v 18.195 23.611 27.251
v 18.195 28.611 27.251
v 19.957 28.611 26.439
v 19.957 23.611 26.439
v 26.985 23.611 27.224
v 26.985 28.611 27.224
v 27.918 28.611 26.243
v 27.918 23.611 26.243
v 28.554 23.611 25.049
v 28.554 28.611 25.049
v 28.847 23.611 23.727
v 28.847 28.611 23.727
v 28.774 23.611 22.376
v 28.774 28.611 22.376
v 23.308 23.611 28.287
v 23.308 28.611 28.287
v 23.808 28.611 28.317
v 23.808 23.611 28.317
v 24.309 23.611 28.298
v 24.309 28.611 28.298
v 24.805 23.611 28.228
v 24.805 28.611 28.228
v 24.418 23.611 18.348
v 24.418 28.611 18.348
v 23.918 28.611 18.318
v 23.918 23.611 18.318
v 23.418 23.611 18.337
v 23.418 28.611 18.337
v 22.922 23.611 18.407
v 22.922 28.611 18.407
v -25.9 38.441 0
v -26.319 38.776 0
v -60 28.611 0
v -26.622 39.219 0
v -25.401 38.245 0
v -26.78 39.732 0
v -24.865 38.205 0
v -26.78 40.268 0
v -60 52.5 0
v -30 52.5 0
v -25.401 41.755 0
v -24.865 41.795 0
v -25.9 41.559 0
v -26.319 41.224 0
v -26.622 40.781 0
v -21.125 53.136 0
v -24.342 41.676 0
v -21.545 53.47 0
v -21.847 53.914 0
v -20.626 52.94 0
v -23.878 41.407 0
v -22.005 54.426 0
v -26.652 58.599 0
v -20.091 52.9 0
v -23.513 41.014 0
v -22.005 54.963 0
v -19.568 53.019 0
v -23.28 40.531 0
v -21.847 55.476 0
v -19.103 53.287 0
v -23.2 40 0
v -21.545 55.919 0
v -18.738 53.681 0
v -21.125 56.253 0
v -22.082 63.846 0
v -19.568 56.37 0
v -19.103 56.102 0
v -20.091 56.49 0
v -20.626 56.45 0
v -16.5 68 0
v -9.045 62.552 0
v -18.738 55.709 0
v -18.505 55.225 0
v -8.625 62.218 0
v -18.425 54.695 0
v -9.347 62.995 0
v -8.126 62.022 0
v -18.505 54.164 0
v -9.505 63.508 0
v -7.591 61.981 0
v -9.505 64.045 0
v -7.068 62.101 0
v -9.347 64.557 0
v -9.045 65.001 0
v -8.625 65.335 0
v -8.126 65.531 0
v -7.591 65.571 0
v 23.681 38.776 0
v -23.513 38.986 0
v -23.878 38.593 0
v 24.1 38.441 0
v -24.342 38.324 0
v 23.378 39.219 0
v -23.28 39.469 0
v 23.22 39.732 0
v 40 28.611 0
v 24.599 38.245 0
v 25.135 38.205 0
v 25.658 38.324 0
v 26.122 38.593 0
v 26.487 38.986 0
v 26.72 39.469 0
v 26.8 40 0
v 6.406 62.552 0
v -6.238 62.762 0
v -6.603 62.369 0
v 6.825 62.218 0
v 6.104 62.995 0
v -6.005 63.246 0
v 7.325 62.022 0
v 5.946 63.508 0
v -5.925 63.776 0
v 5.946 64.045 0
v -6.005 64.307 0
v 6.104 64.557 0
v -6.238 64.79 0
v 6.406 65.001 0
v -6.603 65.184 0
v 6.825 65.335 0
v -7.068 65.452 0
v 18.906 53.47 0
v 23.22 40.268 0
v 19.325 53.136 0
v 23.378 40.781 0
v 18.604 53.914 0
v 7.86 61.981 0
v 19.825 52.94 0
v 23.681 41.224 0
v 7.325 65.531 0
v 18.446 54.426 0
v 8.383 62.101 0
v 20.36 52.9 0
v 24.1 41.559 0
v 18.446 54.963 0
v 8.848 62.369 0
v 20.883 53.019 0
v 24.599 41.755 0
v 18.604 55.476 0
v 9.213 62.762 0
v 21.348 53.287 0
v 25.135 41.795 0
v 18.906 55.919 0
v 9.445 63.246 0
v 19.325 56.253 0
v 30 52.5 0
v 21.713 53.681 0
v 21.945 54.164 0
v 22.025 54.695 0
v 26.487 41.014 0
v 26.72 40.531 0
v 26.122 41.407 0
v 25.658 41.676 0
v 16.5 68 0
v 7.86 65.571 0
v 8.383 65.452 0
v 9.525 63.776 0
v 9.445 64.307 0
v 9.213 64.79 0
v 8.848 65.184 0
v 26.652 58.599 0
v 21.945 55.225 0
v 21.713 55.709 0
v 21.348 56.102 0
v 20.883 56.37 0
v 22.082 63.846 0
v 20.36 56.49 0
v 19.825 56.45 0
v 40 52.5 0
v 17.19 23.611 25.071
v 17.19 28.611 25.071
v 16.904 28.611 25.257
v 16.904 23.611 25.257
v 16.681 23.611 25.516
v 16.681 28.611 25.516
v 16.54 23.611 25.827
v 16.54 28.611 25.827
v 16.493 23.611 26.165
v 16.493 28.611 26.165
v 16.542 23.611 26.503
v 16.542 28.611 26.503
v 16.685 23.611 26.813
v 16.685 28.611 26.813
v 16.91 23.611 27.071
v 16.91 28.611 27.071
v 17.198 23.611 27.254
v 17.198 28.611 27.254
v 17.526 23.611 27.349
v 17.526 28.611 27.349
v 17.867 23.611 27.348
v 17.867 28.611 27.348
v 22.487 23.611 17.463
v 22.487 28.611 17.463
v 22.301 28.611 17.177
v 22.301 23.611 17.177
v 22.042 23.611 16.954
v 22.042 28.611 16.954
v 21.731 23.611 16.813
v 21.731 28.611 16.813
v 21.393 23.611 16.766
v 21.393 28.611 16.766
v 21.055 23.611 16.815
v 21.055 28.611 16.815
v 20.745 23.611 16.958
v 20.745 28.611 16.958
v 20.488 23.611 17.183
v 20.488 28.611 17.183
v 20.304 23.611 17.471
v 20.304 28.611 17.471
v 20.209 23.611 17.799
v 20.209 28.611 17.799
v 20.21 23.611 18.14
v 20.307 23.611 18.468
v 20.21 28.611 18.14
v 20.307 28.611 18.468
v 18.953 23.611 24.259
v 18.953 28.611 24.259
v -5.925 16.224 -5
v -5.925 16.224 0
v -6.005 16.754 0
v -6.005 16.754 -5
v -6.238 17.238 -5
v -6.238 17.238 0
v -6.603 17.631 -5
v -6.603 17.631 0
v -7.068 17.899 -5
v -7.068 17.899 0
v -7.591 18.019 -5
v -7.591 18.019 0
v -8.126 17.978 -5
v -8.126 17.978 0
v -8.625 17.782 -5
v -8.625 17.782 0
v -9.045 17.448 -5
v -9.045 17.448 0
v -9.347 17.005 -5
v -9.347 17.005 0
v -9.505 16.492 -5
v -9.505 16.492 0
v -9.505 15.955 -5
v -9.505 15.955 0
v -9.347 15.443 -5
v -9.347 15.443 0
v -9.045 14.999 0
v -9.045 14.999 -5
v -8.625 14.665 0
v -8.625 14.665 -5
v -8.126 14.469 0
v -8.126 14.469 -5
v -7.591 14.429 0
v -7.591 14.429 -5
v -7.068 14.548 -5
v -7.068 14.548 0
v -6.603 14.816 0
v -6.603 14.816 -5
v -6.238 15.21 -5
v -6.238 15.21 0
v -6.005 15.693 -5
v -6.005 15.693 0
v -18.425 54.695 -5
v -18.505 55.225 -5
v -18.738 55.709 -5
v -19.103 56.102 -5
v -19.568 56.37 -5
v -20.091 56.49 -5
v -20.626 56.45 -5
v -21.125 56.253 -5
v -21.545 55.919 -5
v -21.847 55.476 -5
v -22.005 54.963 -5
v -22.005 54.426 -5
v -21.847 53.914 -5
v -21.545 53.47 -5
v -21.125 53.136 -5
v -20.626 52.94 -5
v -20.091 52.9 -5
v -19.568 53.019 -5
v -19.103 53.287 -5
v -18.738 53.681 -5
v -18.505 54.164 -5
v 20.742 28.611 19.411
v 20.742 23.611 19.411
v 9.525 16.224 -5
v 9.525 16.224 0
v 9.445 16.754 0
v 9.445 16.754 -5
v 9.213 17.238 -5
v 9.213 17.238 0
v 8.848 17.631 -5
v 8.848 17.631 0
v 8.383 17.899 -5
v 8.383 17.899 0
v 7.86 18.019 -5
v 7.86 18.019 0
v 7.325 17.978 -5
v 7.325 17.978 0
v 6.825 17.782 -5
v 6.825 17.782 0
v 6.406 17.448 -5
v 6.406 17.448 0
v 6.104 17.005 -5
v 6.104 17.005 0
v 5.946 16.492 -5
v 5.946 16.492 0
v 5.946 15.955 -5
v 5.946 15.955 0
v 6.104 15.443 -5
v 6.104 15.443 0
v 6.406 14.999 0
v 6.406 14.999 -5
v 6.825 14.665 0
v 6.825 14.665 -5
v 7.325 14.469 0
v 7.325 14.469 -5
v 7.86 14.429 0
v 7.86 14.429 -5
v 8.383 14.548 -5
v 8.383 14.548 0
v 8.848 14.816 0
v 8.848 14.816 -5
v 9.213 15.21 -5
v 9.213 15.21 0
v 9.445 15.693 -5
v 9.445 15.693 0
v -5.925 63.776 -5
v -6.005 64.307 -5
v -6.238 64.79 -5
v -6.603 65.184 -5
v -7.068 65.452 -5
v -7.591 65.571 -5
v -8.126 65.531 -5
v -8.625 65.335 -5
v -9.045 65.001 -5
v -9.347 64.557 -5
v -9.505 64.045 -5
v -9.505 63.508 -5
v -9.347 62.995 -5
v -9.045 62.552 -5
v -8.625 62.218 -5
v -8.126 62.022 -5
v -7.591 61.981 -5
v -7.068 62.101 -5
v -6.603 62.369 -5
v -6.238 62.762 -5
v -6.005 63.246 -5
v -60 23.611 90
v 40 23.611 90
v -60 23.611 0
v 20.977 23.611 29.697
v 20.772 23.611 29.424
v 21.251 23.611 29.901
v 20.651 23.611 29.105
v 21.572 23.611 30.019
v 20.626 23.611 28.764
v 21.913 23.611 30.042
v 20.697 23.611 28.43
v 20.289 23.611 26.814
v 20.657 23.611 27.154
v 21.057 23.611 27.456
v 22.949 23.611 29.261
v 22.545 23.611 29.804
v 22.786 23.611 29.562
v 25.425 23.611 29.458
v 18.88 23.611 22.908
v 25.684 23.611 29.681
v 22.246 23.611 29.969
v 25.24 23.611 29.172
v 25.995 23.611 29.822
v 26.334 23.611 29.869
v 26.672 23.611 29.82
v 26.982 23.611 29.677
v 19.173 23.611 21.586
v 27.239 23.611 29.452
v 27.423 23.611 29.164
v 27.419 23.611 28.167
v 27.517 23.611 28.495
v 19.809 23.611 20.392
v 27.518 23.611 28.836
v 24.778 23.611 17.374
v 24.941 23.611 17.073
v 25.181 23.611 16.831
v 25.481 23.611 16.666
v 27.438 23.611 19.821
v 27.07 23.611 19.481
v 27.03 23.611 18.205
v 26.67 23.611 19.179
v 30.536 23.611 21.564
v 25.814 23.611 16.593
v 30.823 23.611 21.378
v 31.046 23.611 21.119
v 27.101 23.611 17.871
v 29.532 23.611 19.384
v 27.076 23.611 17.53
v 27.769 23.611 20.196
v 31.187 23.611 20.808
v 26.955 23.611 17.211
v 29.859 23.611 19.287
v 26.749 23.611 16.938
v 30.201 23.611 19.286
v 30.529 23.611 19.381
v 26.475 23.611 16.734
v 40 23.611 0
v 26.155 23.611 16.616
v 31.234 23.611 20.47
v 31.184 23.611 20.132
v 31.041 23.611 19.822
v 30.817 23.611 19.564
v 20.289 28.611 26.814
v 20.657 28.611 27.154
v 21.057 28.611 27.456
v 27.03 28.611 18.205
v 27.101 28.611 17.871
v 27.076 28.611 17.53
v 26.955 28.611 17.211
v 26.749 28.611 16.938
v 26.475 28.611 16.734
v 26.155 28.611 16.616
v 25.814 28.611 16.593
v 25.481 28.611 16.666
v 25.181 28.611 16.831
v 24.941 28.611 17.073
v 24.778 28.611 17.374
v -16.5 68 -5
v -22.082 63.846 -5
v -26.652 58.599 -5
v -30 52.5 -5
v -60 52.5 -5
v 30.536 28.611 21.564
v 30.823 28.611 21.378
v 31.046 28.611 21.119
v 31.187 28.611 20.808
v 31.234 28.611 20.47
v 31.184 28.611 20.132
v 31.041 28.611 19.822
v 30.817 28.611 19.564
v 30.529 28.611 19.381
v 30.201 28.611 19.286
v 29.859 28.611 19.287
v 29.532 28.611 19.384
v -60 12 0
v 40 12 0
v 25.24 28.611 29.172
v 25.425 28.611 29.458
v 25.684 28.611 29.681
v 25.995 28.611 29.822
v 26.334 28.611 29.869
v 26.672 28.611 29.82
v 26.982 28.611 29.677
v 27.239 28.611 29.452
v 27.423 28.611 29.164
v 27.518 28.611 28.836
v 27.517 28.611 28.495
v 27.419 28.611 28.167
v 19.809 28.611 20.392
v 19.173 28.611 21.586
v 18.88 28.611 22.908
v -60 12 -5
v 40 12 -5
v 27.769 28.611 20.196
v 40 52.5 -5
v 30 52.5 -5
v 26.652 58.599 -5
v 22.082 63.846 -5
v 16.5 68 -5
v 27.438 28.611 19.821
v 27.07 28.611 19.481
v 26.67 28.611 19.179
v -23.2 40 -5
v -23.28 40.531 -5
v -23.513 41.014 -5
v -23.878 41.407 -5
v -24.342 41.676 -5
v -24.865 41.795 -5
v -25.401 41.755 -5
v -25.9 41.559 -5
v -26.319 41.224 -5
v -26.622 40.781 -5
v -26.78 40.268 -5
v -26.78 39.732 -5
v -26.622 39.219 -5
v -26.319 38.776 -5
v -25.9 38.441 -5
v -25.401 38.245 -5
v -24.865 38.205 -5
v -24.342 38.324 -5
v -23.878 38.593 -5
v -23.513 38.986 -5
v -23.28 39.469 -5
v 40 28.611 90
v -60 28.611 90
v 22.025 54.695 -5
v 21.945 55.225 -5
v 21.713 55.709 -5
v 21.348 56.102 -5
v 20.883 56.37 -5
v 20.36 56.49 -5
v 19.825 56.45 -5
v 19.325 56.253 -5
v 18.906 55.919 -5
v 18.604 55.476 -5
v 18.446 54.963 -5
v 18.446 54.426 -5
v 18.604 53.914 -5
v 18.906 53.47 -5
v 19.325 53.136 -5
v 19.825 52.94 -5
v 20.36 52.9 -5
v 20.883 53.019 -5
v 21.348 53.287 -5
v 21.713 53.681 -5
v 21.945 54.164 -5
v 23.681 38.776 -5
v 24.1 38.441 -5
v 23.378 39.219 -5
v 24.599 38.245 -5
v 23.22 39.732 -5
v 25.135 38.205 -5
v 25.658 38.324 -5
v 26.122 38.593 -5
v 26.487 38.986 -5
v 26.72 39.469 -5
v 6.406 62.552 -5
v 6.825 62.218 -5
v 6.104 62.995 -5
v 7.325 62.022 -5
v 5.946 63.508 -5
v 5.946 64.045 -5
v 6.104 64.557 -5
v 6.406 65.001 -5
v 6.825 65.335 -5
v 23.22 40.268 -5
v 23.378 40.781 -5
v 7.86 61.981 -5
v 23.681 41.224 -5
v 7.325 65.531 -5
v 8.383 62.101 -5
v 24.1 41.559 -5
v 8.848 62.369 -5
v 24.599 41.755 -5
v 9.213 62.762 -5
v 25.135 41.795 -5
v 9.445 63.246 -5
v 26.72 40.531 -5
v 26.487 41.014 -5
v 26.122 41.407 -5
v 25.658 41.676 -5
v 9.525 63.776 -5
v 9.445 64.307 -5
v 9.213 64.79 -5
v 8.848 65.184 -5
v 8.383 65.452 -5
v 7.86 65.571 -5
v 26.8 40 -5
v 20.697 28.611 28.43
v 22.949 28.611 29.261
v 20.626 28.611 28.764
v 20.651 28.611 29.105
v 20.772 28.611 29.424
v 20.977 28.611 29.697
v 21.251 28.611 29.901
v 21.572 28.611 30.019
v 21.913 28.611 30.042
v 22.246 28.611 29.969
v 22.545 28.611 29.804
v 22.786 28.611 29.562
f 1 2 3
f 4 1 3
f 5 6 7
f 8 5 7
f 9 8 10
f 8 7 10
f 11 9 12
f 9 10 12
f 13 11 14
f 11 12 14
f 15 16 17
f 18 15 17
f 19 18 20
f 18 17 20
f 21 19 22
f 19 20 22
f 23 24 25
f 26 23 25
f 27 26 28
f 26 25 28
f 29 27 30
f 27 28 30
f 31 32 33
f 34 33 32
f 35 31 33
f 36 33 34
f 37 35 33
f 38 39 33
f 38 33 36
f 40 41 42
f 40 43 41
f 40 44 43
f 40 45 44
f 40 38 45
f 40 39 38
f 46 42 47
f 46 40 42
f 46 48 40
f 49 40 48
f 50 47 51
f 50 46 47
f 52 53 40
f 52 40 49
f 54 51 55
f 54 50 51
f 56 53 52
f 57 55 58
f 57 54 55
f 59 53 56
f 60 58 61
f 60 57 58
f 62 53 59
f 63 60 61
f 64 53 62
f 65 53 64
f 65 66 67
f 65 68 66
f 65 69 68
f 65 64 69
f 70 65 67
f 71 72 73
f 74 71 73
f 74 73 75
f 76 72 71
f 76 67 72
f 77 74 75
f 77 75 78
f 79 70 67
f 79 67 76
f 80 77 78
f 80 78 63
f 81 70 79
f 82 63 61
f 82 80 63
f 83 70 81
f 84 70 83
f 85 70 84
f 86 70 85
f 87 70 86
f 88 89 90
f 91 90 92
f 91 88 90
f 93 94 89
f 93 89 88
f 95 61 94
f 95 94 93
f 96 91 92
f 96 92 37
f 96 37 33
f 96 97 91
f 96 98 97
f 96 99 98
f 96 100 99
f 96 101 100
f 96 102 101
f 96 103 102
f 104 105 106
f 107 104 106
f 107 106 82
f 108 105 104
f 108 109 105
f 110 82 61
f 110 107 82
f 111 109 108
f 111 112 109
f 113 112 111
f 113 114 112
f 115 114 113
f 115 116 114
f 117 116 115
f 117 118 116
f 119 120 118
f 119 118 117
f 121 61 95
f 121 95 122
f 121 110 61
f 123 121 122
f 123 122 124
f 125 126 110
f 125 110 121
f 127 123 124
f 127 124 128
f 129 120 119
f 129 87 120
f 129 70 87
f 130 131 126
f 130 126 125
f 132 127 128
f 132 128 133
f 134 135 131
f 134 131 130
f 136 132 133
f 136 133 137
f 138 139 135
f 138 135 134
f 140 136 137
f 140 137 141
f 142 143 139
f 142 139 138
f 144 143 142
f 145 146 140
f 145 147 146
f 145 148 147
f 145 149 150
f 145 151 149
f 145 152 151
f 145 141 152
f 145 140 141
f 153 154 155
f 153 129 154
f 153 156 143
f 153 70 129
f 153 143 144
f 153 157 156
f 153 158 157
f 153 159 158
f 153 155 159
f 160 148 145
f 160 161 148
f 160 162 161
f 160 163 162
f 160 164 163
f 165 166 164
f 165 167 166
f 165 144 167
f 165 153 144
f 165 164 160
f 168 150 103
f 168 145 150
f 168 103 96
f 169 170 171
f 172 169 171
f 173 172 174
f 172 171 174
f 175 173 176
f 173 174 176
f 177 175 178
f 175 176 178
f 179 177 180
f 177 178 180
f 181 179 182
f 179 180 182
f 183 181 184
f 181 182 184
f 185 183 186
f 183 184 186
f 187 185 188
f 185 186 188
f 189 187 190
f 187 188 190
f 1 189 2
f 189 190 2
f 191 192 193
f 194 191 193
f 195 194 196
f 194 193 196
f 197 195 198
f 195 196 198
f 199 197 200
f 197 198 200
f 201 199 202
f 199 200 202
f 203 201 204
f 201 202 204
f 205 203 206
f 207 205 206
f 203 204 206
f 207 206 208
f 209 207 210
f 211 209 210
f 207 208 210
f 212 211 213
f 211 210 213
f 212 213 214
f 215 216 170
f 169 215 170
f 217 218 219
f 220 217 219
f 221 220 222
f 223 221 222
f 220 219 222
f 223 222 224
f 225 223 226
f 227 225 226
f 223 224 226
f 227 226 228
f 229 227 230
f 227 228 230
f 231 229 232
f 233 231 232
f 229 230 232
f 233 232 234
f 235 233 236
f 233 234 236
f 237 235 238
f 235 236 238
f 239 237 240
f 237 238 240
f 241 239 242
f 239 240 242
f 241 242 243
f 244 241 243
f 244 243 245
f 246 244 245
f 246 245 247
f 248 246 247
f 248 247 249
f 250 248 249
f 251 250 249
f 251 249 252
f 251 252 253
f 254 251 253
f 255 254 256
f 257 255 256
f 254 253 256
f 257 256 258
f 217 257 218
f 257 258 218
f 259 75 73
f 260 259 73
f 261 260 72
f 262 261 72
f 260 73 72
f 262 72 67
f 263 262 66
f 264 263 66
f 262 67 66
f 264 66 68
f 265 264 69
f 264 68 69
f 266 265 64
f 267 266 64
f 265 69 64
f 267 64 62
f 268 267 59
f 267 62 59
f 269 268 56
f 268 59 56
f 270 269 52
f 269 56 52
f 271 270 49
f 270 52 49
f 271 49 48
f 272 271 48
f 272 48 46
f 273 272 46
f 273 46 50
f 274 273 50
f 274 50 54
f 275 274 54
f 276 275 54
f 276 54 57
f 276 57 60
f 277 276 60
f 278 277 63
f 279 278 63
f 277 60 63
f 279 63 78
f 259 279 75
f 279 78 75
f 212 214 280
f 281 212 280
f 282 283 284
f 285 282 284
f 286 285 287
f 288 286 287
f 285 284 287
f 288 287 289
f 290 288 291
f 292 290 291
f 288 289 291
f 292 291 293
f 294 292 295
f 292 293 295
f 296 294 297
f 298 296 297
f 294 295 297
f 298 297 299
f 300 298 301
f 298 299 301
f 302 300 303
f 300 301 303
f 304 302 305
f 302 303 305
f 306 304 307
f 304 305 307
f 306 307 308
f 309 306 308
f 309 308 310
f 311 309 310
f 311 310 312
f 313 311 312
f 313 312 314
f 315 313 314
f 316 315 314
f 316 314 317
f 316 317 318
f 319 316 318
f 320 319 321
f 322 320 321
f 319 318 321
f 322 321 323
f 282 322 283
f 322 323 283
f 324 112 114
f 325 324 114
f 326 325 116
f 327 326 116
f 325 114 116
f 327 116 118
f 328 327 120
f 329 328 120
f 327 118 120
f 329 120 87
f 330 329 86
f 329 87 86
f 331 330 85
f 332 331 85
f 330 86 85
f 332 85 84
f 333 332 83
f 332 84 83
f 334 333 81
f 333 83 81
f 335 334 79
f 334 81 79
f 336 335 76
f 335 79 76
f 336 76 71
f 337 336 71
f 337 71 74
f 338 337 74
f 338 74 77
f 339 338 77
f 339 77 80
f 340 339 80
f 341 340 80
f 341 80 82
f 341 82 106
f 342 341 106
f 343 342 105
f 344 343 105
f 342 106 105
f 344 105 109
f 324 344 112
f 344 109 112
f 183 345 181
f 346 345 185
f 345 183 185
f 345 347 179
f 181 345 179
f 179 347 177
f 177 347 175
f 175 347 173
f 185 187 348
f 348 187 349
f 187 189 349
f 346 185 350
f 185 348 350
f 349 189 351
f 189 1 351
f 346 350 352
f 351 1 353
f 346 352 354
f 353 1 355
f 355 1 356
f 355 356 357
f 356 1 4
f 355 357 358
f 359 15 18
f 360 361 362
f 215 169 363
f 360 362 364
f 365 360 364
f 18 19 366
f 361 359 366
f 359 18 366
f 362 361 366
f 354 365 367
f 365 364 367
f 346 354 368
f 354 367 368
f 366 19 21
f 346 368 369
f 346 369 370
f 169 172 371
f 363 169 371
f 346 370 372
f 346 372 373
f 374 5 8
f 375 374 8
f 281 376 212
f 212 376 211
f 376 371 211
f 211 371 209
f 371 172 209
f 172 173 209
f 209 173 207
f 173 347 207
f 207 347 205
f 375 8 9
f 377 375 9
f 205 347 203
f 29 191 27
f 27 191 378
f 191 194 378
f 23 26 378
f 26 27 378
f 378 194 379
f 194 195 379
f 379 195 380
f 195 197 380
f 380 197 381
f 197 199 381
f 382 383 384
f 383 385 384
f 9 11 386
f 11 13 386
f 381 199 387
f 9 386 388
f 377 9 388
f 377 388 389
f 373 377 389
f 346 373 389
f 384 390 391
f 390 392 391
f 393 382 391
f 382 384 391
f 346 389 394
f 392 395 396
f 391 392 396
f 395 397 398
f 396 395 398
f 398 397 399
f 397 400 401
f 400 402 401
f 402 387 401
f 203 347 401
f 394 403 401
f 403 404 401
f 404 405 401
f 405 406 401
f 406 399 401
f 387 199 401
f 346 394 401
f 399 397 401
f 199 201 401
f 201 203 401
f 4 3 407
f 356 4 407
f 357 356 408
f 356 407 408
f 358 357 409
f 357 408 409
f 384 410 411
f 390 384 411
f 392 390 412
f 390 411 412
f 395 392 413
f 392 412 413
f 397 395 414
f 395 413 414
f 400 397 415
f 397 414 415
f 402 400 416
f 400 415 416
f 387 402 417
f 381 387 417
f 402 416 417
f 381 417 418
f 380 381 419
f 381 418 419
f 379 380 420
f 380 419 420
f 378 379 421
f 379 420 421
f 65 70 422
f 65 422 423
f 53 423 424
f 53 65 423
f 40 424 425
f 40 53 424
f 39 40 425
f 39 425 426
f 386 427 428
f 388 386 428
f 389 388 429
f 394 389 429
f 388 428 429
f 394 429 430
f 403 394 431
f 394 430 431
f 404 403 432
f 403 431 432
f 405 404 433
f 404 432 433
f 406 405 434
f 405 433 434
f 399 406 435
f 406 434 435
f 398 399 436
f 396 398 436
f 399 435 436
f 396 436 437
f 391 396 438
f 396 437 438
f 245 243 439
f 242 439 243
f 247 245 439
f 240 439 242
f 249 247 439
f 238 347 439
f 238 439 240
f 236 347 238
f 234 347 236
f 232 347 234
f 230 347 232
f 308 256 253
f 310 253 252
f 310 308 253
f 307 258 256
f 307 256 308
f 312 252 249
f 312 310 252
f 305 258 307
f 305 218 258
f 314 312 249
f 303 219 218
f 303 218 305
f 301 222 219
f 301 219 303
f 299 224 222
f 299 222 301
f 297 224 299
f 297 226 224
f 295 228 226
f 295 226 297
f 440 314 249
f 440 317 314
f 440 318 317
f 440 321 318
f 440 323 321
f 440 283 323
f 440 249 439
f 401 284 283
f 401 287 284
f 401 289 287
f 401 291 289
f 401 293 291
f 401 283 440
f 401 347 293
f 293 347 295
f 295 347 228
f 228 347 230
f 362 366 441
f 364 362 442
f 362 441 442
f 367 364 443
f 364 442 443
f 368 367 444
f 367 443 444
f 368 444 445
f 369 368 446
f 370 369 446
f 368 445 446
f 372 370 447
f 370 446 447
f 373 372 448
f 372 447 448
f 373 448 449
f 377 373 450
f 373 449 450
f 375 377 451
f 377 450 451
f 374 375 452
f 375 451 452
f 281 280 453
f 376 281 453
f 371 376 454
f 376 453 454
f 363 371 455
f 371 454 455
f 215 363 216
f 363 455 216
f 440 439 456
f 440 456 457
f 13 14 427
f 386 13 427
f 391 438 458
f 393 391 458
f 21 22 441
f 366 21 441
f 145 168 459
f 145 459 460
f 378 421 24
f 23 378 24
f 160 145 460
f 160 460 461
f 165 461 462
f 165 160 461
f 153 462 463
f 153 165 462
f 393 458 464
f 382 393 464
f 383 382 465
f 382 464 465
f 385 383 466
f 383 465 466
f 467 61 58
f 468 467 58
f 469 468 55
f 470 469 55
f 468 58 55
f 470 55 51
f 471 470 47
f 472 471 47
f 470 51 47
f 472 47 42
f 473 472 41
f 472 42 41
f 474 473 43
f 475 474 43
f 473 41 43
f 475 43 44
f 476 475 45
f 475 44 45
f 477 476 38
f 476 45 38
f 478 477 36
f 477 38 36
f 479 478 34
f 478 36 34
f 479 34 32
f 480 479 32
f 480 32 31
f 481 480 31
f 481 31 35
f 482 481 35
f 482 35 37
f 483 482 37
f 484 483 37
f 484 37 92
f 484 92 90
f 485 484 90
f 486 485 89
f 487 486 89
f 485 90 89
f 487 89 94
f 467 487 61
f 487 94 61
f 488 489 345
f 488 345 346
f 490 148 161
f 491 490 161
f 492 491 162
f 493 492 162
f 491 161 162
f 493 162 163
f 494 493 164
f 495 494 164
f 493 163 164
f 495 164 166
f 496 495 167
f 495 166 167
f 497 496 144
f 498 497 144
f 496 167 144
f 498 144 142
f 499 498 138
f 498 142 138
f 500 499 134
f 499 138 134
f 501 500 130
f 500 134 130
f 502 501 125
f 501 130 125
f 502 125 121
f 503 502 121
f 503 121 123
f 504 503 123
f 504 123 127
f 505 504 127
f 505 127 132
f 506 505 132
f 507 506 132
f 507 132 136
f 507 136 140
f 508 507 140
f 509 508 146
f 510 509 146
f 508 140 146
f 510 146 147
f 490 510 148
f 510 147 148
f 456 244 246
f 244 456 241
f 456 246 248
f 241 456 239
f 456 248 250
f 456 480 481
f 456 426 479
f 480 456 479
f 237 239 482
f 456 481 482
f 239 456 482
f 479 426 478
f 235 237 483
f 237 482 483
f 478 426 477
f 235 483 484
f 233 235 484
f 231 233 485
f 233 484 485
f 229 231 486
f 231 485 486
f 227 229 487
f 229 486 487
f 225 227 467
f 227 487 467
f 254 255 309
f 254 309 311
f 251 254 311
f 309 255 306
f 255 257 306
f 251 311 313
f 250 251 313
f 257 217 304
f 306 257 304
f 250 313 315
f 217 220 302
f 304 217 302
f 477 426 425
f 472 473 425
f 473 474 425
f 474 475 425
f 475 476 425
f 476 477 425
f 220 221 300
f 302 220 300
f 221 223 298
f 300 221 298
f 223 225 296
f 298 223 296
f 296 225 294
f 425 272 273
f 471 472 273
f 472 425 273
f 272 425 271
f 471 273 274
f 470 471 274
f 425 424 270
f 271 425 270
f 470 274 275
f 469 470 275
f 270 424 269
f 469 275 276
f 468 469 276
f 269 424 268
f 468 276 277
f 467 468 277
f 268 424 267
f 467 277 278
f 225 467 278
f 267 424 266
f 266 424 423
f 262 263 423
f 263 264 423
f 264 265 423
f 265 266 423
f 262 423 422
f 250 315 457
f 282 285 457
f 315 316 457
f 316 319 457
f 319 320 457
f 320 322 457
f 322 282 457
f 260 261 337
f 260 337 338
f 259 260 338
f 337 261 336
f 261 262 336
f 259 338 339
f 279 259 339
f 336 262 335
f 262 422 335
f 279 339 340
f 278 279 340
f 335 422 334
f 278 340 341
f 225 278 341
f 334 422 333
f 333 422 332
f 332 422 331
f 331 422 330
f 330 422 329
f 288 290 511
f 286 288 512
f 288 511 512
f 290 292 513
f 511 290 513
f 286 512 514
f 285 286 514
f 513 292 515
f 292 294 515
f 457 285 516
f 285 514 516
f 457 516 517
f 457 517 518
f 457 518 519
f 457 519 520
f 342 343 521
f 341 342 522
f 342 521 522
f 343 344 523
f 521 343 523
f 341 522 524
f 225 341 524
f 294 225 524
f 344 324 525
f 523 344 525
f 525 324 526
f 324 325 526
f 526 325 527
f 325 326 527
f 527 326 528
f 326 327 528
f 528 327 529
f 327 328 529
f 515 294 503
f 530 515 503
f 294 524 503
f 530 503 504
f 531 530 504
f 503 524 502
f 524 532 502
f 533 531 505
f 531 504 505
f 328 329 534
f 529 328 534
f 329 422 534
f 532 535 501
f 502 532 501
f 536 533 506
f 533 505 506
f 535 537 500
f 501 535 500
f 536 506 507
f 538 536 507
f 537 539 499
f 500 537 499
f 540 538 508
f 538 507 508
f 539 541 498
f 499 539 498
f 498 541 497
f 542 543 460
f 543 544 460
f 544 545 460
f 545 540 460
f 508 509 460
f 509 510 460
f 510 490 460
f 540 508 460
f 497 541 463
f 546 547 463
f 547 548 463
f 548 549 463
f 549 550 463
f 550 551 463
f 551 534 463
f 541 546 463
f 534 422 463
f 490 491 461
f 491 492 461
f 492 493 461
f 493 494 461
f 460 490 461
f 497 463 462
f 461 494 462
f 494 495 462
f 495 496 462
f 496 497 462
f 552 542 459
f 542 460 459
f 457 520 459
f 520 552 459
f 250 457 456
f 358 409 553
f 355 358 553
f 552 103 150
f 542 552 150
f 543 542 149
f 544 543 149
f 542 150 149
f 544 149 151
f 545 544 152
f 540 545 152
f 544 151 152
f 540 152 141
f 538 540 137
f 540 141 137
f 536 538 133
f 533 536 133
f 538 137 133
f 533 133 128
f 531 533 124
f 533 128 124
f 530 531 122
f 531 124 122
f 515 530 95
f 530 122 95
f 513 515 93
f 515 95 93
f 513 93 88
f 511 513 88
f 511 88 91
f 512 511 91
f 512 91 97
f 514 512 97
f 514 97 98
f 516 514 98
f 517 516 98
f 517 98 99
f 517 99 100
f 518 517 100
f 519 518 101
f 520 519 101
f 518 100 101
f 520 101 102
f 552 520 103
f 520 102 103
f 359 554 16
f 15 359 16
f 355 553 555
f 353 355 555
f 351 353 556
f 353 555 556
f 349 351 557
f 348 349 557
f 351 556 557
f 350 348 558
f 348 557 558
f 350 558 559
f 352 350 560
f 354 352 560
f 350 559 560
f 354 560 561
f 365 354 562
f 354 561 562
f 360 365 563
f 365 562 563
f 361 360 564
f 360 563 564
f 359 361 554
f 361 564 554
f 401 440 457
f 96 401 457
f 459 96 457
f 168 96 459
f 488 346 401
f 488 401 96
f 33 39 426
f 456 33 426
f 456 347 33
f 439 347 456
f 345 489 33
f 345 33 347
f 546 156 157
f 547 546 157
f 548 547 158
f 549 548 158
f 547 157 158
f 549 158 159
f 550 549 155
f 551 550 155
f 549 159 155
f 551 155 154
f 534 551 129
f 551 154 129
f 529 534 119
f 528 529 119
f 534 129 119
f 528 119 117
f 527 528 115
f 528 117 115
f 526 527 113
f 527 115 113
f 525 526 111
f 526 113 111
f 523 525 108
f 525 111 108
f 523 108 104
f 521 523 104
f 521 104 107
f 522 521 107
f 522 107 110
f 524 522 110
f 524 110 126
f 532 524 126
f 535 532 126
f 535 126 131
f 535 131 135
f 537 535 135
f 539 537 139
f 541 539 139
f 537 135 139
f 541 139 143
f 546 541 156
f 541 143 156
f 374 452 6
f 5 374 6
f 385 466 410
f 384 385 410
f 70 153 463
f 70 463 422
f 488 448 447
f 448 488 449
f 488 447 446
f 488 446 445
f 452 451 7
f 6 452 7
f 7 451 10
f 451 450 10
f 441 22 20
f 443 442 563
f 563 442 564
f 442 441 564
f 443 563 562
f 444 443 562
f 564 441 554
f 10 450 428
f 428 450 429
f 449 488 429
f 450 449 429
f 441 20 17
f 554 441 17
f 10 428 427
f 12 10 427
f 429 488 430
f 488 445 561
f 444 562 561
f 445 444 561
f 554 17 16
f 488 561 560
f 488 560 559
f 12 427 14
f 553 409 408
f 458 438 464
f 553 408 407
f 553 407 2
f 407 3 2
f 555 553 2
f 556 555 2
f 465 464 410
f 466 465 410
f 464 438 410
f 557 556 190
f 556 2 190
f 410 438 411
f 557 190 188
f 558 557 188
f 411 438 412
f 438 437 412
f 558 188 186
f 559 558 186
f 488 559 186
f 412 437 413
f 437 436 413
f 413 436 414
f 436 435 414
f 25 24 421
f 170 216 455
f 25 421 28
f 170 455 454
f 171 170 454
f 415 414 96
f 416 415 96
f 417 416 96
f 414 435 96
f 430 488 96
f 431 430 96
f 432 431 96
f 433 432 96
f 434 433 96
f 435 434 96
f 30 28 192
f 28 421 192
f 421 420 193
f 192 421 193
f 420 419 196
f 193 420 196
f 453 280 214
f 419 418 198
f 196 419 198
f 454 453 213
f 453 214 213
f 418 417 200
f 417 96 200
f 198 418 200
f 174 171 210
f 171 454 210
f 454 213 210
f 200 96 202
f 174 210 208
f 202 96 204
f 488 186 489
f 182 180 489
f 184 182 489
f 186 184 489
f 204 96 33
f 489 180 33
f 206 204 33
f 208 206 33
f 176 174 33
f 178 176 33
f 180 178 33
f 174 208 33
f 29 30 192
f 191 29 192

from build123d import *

# Parameters (mm, degrees)
SKETCH2_R           = 1.8
BOSS_EXTRUDE1_DEPTH = 5
SKETCH3_R           = 1.8
BOSS_EXTRUDE2_DEPTH = 5
BOSS_EXTRUDE3_DEPTH = 90
SKETCH5_R           = 1
CUT_EXTRUDE3_DEPTH  = 90
CUT_EXTRUDE4_DEPTH  = 90


with BuildPart() as part:
    # Sketch2 → Boss-Extrude1 (new body)
    with BuildSketch(Plane.XY):
        with BuildLine():
            ThreePointArc((30, 52.5), (24.507651866, 61.345374206), (16.5, 68))
            Line((16.5, 68), (-16.5, 68))
            ThreePointArc((-16.5, 68), (-24.507651866, 61.345374206), (-30, 52.5))
            Line((-30, 52.5), (-60, 52.5))
            Line((-60, 52.5), (-60, 12))
            Line((-60, 12), (40, 12))
            Line((40, 12), (40, 52.5))
            Line((40, 52.5), (30, 52.5))
        make_face()
        with Locations((-20.225424859, 25.305368693)):
            Circle(SKETCH2_R, mode=Mode.SUBTRACT)
        with Locations((-25, 40)):
            Circle(SKETCH2_R, mode=Mode.SUBTRACT)
        with Locations((-7.725424859, 16.223587093)):
            Circle(SKETCH2_R, mode=Mode.SUBTRACT)
        with Locations((7.725424859, 16.223587093)):
            Circle(SKETCH2_R, mode=Mode.SUBTRACT)
        with Locations((20.225424859, 25.305368693)):
            Circle(SKETCH2_R, mode=Mode.SUBTRACT)
        with Locations((25, 40)):
            Circle(SKETCH2_R, mode=Mode.SUBTRACT)
        with Locations((-20.225424859, 54.694631307)):
            Circle(SKETCH2_R, mode=Mode.SUBTRACT)
        with Locations((-7.725424859, 63.776412907)):
            Circle(SKETCH2_R, mode=Mode.SUBTRACT)
        with Locations((7.725424859, 63.776412907)):
            Circle(SKETCH2_R, mode=Mode.SUBTRACT)
        with Locations((20.225424859, 54.694631307)):
            Circle(SKETCH2_R, mode=Mode.SUBTRACT)
    extrude(amount=-BOSS_EXTRUDE1_DEPTH)

    # Sketch3 → Boss-Extrude2 (add)
    with BuildSketch(Plane.XY):
        with Locations((-20.225424859, 25.305368693)):
            Circle(SKETCH3_R)
        with Locations((20.225424859, 25.305368693)):
            Circle(SKETCH3_R)
    extrude(amount=-BOSS_EXTRUDE2_DEPTH)

    # Sketch4 → Boss-Extrude3 (add)
    with BuildSketch(Plane.XY):
        Polygon((15.062255845, 23.611), (32.664455845, 23.611), (40, 23.611), (40, 28.611), (-60, 28.611), (-60, 23.611), align=None)
    extrude(amount=BOSS_EXTRUDE3_DEPTH)

    # Sketch5 → Cut-Extrude3 (cut)
    with BuildSketch(Plane(origin=(0, 28.611, 0), x_dir=(1, 0, 0), z_dir=(0, 1, 0))):
        with BuildLine():
            ThreePointArc((20.99034902, -19.472254538), (21.854479486, -18.958084045), (22.806767952, -18.635222722))
            Line((22.806767952, -18.635222722), (22.305334768, -17.547076832))
            ThreePointArc((22.305334768, -17.547076832), (22.37390815, -17.751360934), (22.397125301, -17.96559274))
            ThreePointArc((22.397125301, -17.96559274), (21.611357108, -18.942375589), (20.488915835, -18.384108649))
            Line((20.488915835, -18.384108649), (20.99034902, -19.472254538))
        make_face()
        with BuildLine():
            ThreePointArc((24.550824941, -18.56697517), (25.525430896, -18.81443424), (26.42709796, -19.259506441))
            Line((26.42709796, -19.259506441), (26.841966492, -18.135504299))
            ThreePointArc((26.841966492, -18.135504299), (25.557564347, -18.727375172), (24.965693474, -17.442973027))
            Line((24.965693474, -17.442973027), (24.550824941, -18.56697517))
        make_face()
        with BuildLine():
            ThreePointArc((27.70859079, -20.444482658), (28.222761283, -21.308613124), (28.545622606, -22.260901591))
            Line((28.545622606, -22.260901591), (30.452700972, -21.382092612))
            ThreePointArc((30.452700972, -21.382092612), (29.125975597, -20.892399054), (29.615669155, -19.565673679))
            Line((29.615669155, -19.565673679), (27.70859079, -20.444482658))
        make_face()
        with BuildLine():
            ThreePointArc((25.421376922, -29.087902134), (25.91107048, -27.76117676), (27.237795855, -28.250870318))
            Line((27.237795855, -28.250870318), (26.73636267, -27.162724428))
            ThreePointArc((26.73636267, -27.162724428), (25.872232204, -27.676894921), (24.919943737, -27.999756245))
            Line((24.919943737, -27.999756245), (25.421376922, -29.087902134))
        make_face()
        with BuildLine():
            Line((22.761018216, -29.192005939), (23.175886748, -28.068003797))
            ThreePointArc((23.175886748, -28.068003797), (22.201280794, -27.820544727), (21.29961373, -27.375472525))
            Line((21.29961373, -27.375472525), (20.884745198, -28.499474668))
            ThreePointArc((20.884745198, -28.499474668), (21.998755939, -27.861327659), (22.822881707, -28.845740304))
            ThreePointArc((22.822881707, -28.845740304), (22.807294351, -29.021614536), (22.761018216, -29.192005939))
        make_face()
        with BuildLine():
            Line((18.111042534, -27.069305287), (20.0181209, -26.190496308))
            ThreePointArc((20.0181209, -26.190496308), (19.503950407, -25.326365842), (19.181089083, -24.374077376))
            Line((19.181089083, -24.374077376), (17.274010718, -25.252886355))
            ThreePointArc((17.274010718, -25.252886355), (18.231731639, -25.318921282), (18.692526626, -26.161095821))
            ThreePointArc((18.692526626, -26.161095821), (18.534701165, -26.700300834), (18.111042534, -27.069305287))
        make_face()
        with Locations((17.692526626, -26.161095821)):
            Circle(SKETCH5_R)
        with Locations((21.822881707, -28.845740304)):
            Circle(SKETCH5_R)
        with Locations((26.329586388, -28.669386226)):
            Circle(SKETCH5_R)
        with Locations((30.034185063, -20.473883145)):
            Circle(SKETCH5_R)
        with Locations((25.903829983, -17.789238663)):
            Circle(SKETCH5_R)
        with Locations((21.397125301, -17.96559274)):
            Circle(SKETCH5_R)
        with BuildLine():
            Line((22.806767952, -18.635222722), (23.76117853, -20.706361964))
            Line((23.76117853, -20.706361964), (24.550824941, -18.56697517))
            ThreePointArc((24.550824941, -18.56697517), (23.675668329, -18.521160325), (22.806767952, -18.635222722))
        make_face()
        with BuildLine():
            Line((23.068647258, -22.582634982), (23.76117853, -20.706361964))
            Line((23.76117853, -20.706361964), (22.806767952, -18.635222722))
            ThreePointArc((22.806767952, -18.635222722), (21.854479486, -18.958084045), (20.99034902, -19.472254538))
            Line((20.99034902, -19.472254538), (22.53663047, -22.827795925))
            Line((22.53663047, -22.827795925), (23.068647258, -22.582634982))
        make_face()
        with BuildLine():
            Line((19.181089083, -24.374077376), (22.53663047, -22.827795925))
            Line((22.53663047, -22.827795925), (20.99034902, -19.472254538))
            ThreePointArc((20.99034902, -19.472254538), (19.360300602, -21.655414432), (19.181089083, -24.374077376))
        make_face()
        with BuildLine():
            Line((22.089260142, -25.236085731), (22.781791413, -23.359812713))
            Line((22.781791413, -23.359812713), (22.53663047, -22.827795925))
            Line((22.53663047, -22.827795925), (19.181089083, -24.374077376))
            ThreePointArc((19.181089083, -24.374077376), (19.503950407, -25.326365842), (20.0181209, -26.190496308))
            Line((20.0181209, -26.190496308), (22.089260142, -25.236085731))
        make_face()
        with BuildLine():
            ThreePointArc((20.0181209, -26.190496308), (20.604554087, -26.841721471), (21.29961373, -27.375472525))
            Line((21.29961373, -27.375472525), (22.089260142, -25.236085731))
            Line((22.089260142, -25.236085731), (20.0181209, -26.190496308))
        make_face()
        with BuildLine():
            Line((23.175886748, -28.068003797), (23.96553316, -25.928617002))
            Line((23.96553316, -25.928617002), (23.373662287, -24.644214858))
            Line((23.373662287, -24.644214858), (22.089260142, -25.236085731))
            Line((22.089260142, -25.236085731), (21.29961373, -27.375472525))
            ThreePointArc((21.29961373, -27.375472525), (22.201280794, -27.820544727), (23.175886748, -28.068003797))
        make_face()
        with BuildLine():
            ThreePointArc((23.175886748, -28.068003797), (24.05104336, -28.113818642), (24.919943737, -27.999756245))
            Line((24.919943737, -27.999756245), (23.96553316, -25.928617002))
            Line((23.96553316, -25.928617002), (23.175886748, -28.068003797))
        make_face()
        with BuildLine():
            ThreePointArc((24.919943737, -27.999756245), (25.872232204, -27.676894921), (26.73636267, -27.162724428))
            Line((26.73636267, -27.162724428), (25.190081219, -23.807183041))
            Line((25.190081219, -23.807183041), (24.658064431, -24.052343984))
            Line((24.658064431, -24.052343984), (23.96553316, -25.928617002))
            Line((23.96553316, -25.928617002), (24.919943737, -27.999756245))
        make_face()
        with BuildLine():
            Line((25.190081219, -23.807183041), (26.73636267, -27.162724428))
            ThreePointArc((26.73636267, -27.162724428), (28.154651265, -25.468020492), (28.663355845, -23.317489483))
            ThreePointArc((28.663355845, -23.317489483), (28.633831736, -22.785925966), (28.545622606, -22.260901591))
            Line((28.545622606, -22.260901591), (25.190081219, -23.807183041))
        make_face()
        with BuildLine():
            Line((24.944920276, -23.275166254), (25.190081219, -23.807183041))
            Line((25.190081219, -23.807183041), (28.545622606, -22.260901591))
            ThreePointArc((28.545622606, -22.260901591), (28.222761283, -21.308613124), (27.70859079, -20.444482658))
            Line((27.70859079, -20.444482658), (25.637451548, -21.398893235))
            Line((25.637451548, -21.398893235), (24.944920276, -23.275166254))
        make_face()
        with BuildLine():
            Line((26.42709796, -19.259506441), (25.637451548, -21.398893235))
            Line((25.637451548, -21.398893235), (27.70859079, -20.444482658))
            ThreePointArc((27.70859079, -20.444482658), (27.122157603, -19.793257496), (26.42709796, -19.259506441))
        make_face()
        Polygon((24.353049403, -21.990764109), (24.944920276, -23.275166254), (25.637451548, -21.398893235), align=None)
        with BuildLine():
            Line((23.76117853, -20.706361964), (24.353049403, -21.990764109))
            Line((24.353049403, -21.990764109), (25.637451548, -21.398893235))
            Line((25.637451548, -21.398893235), (26.42709796, -19.259506441))
            ThreePointArc((26.42709796, -19.259506441), (25.525430896, -18.81443424), (24.550824941, -18.56697517))
            Line((24.550824941, -18.56697517), (23.76117853, -20.706361964))
        make_face()
        Polygon((23.068647258, -22.582634982), (24.353049403, -21.990764109), (23.76117853, -20.706361964), align=None)
        Polygon((22.781791413, -23.359812713), (23.068647258, -22.582634982), (22.53663047, -22.827795925), align=None)
        Polygon((22.089260142, -25.236085731), (23.373662287, -24.644214858), (22.781791413, -23.359812713), align=None)
        Polygon((23.96553316, -25.928617002), (24.658064431, -24.052343984), (23.373662287, -24.644214858), align=None)
        Polygon((24.658064431, -24.052343984), (25.190081219, -23.807183041), (24.944920276, -23.275166254), align=None)
        Polygon((24.658064431, -24.052343984), (24.944920276, -23.275166254), (24.353049403, -21.990764109), (23.068647258, -22.582634982), (22.781791413, -23.359812713), (23.373662287, -24.644214858), align=None)
    extrude(amount=-CUT_EXTRUDE3_DEPTH, mode=Mode.SUBTRACT)

    # Sketch6 → Cut-Extrude4 (cut)
    with BuildSketch(Plane(origin=(0, 28.611, 0), x_dir=(1, 0, 0), z_dir=(0, 1, 0))):
        with BuildLine():
            ThreePointArc((27.029593793, -18.204757426), (26.319348745, -16.663474852), (24.778066172, -17.3737199))
            Line((24.778066172, -17.3737199), (24.41831849, -18.34838328))
            ThreePointArc((24.41831849, -18.34838328), (23.667848016, -18.321313277), (22.92178772, -18.406944761))
            Line((22.92178772, -18.406944761), (22.486976661, -17.463373651))
            ThreePointArc((22.486976661, -17.463373651), (20.894906212, -16.875741381), (20.307273942, -18.46781183))
            Line((20.307273942, -18.46781183), (20.742085001, -19.411382941))
            ThreePointArc((20.742085001, -19.411382941), (19.1726733, -21.586161305), (18.952811123, -24.259057608))
            Line((18.952811123, -24.259057608), (17.190307536, -25.071244462))
            ThreePointArc((17.190307536, -25.071244462), (16.602675267, -26.663314911), (18.194745716, -27.250947181))
            Line((18.194745716, -27.250947181), (19.957249302, -26.438760327))
            ThreePointArc((19.957249302, -26.438760327), (20.46877068, -26.98856447), (21.056865578, -27.455558161))
            Line((21.056865578, -27.455558161), (20.697117896, -28.430221541))
            ThreePointArc((20.697117896, -28.430221541), (21.407362944, -29.971504114), (22.948645518, -29.261259066))
            Line((22.948645518, -29.261259066), (23.3083932, -28.286595687))
            ThreePointArc((23.3083932, -28.286595687), (24.058863673, -28.31366569), (24.804923969, -28.228034205))
            Line((24.804923969, -28.228034205), (25.239735029, -29.171605316))
            ThreePointArc((25.239735029, -29.171605316), (26.831805478, -29.759237586), (27.419437748, -28.167167136))
            Line((27.419437748, -28.167167136), (26.984626688, -27.223596026))
            ThreePointArc((26.984626688, -27.223596026), (28.55403839, -25.048817662), (28.773900567, -22.375921359))
            Line((28.773900567, -22.375921359), (30.536404153, -21.563734505))
            ThreePointArc((30.536404153, -21.563734505), (31.124036423, -19.971664056), (29.531965974, -19.384031786))
            Line((29.531965974, -19.384031786), (27.769462387, -20.19621864))
            ThreePointArc((27.769462387, -20.19621864), (27.257941009, -19.646414496), (26.669846111, -19.179420805))
            Line((26.669846111, -19.179420805), (27.029593793, -18.204757426))
        make_face()
        with BuildLine():
            ThreePointArc((19.181089083, -24.374077376), (19.360300602, -21.655414432), (20.99034902, -19.472254538))
            Line((20.99034902, -19.472254538), (20.488915835, -18.384108649))
            ThreePointArc((20.488915835, -18.384108649), (20.978609393, -17.057383274), (22.305334768, -17.547076832))
            Line((22.305334768, -17.547076832), (22.806767952, -18.635222722))
            ThreePointArc((22.806767952, -18.635222722), (23.675668329, -18.521160325), (24.550824941, -18.56697517))
            Line((24.550824941, -18.56697517), (24.965693474, -17.442973027))
            ThreePointArc((24.965693474, -17.442973027), (26.250095618, -16.851102154), (26.841966492, -18.135504299))
            Line((26.841966492, -18.135504299), (26.42709796, -19.259506441))
            ThreePointArc((26.42709796, -19.259506441), (27.122157603, -19.793257496), (27.70859079, -20.444482658))
            Line((27.70859079, -20.444482658), (29.615669155, -19.565673679))
            ThreePointArc((29.615669155, -19.565673679), (30.94239453, -20.055367237), (30.452700972, -21.382092612))
            Line((30.452700972, -21.382092612), (28.545622606, -22.260901591))
            ThreePointArc((28.545622606, -22.260901591), (28.366411088, -24.979564534), (26.73636267, -27.162724428))
            Line((26.73636267, -27.162724428), (27.237795855, -28.250870318))
            ThreePointArc((27.237795855, -28.250870318), (26.748102297, -29.577595692), (25.421376922, -29.087902134))
            Line((25.421376922, -29.087902134), (24.919943737, -27.999756245))
            ThreePointArc((24.919943737, -27.999756245), (24.05104336, -28.113818642), (23.175886748, -28.068003797))
            Line((23.175886748, -28.068003797), (22.761018216, -29.192005939))
            ThreePointArc((22.761018216, -29.192005939), (21.476616071, -29.783876813), (20.884745198, -28.499474668))
            Line((20.884745198, -28.499474668), (21.29961373, -27.375472525))
            ThreePointArc((21.29961373, -27.375472525), (20.604554087, -26.841721471), (20.0181209, -26.190496308))
            Line((20.0181209, -26.190496308), (18.111042534, -27.069305287))
            ThreePointArc((18.111042534, -27.069305287), (16.78431716, -26.579611729), (17.274010718, -25.252886355))
            Line((17.274010718, -25.252886355), (19.181089083, -24.374077376))
        make_face(mode=Mode.SUBTRACT)
    extrude(amount=-CUT_EXTRUDE4_DEPTH, mode=Mode.SUBTRACT)


solid = part.part
